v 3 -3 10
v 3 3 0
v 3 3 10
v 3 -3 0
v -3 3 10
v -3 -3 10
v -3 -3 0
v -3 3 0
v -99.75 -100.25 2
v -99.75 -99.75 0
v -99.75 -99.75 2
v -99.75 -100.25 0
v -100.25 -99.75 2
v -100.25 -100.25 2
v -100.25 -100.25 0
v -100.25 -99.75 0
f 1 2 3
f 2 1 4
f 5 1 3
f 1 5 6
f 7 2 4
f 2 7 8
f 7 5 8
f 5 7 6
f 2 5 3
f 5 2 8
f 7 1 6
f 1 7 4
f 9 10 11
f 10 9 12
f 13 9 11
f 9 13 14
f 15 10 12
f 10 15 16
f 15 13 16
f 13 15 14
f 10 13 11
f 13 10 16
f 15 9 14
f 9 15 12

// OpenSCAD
translate([0, 0, 5]) color([0,1,0,0.9]) cube([6, 6, 10], center=true);
translate([-100.0, -100.0, 1]) color([1,0,0]) cube([0.5, 0.5, 2], center=true);
